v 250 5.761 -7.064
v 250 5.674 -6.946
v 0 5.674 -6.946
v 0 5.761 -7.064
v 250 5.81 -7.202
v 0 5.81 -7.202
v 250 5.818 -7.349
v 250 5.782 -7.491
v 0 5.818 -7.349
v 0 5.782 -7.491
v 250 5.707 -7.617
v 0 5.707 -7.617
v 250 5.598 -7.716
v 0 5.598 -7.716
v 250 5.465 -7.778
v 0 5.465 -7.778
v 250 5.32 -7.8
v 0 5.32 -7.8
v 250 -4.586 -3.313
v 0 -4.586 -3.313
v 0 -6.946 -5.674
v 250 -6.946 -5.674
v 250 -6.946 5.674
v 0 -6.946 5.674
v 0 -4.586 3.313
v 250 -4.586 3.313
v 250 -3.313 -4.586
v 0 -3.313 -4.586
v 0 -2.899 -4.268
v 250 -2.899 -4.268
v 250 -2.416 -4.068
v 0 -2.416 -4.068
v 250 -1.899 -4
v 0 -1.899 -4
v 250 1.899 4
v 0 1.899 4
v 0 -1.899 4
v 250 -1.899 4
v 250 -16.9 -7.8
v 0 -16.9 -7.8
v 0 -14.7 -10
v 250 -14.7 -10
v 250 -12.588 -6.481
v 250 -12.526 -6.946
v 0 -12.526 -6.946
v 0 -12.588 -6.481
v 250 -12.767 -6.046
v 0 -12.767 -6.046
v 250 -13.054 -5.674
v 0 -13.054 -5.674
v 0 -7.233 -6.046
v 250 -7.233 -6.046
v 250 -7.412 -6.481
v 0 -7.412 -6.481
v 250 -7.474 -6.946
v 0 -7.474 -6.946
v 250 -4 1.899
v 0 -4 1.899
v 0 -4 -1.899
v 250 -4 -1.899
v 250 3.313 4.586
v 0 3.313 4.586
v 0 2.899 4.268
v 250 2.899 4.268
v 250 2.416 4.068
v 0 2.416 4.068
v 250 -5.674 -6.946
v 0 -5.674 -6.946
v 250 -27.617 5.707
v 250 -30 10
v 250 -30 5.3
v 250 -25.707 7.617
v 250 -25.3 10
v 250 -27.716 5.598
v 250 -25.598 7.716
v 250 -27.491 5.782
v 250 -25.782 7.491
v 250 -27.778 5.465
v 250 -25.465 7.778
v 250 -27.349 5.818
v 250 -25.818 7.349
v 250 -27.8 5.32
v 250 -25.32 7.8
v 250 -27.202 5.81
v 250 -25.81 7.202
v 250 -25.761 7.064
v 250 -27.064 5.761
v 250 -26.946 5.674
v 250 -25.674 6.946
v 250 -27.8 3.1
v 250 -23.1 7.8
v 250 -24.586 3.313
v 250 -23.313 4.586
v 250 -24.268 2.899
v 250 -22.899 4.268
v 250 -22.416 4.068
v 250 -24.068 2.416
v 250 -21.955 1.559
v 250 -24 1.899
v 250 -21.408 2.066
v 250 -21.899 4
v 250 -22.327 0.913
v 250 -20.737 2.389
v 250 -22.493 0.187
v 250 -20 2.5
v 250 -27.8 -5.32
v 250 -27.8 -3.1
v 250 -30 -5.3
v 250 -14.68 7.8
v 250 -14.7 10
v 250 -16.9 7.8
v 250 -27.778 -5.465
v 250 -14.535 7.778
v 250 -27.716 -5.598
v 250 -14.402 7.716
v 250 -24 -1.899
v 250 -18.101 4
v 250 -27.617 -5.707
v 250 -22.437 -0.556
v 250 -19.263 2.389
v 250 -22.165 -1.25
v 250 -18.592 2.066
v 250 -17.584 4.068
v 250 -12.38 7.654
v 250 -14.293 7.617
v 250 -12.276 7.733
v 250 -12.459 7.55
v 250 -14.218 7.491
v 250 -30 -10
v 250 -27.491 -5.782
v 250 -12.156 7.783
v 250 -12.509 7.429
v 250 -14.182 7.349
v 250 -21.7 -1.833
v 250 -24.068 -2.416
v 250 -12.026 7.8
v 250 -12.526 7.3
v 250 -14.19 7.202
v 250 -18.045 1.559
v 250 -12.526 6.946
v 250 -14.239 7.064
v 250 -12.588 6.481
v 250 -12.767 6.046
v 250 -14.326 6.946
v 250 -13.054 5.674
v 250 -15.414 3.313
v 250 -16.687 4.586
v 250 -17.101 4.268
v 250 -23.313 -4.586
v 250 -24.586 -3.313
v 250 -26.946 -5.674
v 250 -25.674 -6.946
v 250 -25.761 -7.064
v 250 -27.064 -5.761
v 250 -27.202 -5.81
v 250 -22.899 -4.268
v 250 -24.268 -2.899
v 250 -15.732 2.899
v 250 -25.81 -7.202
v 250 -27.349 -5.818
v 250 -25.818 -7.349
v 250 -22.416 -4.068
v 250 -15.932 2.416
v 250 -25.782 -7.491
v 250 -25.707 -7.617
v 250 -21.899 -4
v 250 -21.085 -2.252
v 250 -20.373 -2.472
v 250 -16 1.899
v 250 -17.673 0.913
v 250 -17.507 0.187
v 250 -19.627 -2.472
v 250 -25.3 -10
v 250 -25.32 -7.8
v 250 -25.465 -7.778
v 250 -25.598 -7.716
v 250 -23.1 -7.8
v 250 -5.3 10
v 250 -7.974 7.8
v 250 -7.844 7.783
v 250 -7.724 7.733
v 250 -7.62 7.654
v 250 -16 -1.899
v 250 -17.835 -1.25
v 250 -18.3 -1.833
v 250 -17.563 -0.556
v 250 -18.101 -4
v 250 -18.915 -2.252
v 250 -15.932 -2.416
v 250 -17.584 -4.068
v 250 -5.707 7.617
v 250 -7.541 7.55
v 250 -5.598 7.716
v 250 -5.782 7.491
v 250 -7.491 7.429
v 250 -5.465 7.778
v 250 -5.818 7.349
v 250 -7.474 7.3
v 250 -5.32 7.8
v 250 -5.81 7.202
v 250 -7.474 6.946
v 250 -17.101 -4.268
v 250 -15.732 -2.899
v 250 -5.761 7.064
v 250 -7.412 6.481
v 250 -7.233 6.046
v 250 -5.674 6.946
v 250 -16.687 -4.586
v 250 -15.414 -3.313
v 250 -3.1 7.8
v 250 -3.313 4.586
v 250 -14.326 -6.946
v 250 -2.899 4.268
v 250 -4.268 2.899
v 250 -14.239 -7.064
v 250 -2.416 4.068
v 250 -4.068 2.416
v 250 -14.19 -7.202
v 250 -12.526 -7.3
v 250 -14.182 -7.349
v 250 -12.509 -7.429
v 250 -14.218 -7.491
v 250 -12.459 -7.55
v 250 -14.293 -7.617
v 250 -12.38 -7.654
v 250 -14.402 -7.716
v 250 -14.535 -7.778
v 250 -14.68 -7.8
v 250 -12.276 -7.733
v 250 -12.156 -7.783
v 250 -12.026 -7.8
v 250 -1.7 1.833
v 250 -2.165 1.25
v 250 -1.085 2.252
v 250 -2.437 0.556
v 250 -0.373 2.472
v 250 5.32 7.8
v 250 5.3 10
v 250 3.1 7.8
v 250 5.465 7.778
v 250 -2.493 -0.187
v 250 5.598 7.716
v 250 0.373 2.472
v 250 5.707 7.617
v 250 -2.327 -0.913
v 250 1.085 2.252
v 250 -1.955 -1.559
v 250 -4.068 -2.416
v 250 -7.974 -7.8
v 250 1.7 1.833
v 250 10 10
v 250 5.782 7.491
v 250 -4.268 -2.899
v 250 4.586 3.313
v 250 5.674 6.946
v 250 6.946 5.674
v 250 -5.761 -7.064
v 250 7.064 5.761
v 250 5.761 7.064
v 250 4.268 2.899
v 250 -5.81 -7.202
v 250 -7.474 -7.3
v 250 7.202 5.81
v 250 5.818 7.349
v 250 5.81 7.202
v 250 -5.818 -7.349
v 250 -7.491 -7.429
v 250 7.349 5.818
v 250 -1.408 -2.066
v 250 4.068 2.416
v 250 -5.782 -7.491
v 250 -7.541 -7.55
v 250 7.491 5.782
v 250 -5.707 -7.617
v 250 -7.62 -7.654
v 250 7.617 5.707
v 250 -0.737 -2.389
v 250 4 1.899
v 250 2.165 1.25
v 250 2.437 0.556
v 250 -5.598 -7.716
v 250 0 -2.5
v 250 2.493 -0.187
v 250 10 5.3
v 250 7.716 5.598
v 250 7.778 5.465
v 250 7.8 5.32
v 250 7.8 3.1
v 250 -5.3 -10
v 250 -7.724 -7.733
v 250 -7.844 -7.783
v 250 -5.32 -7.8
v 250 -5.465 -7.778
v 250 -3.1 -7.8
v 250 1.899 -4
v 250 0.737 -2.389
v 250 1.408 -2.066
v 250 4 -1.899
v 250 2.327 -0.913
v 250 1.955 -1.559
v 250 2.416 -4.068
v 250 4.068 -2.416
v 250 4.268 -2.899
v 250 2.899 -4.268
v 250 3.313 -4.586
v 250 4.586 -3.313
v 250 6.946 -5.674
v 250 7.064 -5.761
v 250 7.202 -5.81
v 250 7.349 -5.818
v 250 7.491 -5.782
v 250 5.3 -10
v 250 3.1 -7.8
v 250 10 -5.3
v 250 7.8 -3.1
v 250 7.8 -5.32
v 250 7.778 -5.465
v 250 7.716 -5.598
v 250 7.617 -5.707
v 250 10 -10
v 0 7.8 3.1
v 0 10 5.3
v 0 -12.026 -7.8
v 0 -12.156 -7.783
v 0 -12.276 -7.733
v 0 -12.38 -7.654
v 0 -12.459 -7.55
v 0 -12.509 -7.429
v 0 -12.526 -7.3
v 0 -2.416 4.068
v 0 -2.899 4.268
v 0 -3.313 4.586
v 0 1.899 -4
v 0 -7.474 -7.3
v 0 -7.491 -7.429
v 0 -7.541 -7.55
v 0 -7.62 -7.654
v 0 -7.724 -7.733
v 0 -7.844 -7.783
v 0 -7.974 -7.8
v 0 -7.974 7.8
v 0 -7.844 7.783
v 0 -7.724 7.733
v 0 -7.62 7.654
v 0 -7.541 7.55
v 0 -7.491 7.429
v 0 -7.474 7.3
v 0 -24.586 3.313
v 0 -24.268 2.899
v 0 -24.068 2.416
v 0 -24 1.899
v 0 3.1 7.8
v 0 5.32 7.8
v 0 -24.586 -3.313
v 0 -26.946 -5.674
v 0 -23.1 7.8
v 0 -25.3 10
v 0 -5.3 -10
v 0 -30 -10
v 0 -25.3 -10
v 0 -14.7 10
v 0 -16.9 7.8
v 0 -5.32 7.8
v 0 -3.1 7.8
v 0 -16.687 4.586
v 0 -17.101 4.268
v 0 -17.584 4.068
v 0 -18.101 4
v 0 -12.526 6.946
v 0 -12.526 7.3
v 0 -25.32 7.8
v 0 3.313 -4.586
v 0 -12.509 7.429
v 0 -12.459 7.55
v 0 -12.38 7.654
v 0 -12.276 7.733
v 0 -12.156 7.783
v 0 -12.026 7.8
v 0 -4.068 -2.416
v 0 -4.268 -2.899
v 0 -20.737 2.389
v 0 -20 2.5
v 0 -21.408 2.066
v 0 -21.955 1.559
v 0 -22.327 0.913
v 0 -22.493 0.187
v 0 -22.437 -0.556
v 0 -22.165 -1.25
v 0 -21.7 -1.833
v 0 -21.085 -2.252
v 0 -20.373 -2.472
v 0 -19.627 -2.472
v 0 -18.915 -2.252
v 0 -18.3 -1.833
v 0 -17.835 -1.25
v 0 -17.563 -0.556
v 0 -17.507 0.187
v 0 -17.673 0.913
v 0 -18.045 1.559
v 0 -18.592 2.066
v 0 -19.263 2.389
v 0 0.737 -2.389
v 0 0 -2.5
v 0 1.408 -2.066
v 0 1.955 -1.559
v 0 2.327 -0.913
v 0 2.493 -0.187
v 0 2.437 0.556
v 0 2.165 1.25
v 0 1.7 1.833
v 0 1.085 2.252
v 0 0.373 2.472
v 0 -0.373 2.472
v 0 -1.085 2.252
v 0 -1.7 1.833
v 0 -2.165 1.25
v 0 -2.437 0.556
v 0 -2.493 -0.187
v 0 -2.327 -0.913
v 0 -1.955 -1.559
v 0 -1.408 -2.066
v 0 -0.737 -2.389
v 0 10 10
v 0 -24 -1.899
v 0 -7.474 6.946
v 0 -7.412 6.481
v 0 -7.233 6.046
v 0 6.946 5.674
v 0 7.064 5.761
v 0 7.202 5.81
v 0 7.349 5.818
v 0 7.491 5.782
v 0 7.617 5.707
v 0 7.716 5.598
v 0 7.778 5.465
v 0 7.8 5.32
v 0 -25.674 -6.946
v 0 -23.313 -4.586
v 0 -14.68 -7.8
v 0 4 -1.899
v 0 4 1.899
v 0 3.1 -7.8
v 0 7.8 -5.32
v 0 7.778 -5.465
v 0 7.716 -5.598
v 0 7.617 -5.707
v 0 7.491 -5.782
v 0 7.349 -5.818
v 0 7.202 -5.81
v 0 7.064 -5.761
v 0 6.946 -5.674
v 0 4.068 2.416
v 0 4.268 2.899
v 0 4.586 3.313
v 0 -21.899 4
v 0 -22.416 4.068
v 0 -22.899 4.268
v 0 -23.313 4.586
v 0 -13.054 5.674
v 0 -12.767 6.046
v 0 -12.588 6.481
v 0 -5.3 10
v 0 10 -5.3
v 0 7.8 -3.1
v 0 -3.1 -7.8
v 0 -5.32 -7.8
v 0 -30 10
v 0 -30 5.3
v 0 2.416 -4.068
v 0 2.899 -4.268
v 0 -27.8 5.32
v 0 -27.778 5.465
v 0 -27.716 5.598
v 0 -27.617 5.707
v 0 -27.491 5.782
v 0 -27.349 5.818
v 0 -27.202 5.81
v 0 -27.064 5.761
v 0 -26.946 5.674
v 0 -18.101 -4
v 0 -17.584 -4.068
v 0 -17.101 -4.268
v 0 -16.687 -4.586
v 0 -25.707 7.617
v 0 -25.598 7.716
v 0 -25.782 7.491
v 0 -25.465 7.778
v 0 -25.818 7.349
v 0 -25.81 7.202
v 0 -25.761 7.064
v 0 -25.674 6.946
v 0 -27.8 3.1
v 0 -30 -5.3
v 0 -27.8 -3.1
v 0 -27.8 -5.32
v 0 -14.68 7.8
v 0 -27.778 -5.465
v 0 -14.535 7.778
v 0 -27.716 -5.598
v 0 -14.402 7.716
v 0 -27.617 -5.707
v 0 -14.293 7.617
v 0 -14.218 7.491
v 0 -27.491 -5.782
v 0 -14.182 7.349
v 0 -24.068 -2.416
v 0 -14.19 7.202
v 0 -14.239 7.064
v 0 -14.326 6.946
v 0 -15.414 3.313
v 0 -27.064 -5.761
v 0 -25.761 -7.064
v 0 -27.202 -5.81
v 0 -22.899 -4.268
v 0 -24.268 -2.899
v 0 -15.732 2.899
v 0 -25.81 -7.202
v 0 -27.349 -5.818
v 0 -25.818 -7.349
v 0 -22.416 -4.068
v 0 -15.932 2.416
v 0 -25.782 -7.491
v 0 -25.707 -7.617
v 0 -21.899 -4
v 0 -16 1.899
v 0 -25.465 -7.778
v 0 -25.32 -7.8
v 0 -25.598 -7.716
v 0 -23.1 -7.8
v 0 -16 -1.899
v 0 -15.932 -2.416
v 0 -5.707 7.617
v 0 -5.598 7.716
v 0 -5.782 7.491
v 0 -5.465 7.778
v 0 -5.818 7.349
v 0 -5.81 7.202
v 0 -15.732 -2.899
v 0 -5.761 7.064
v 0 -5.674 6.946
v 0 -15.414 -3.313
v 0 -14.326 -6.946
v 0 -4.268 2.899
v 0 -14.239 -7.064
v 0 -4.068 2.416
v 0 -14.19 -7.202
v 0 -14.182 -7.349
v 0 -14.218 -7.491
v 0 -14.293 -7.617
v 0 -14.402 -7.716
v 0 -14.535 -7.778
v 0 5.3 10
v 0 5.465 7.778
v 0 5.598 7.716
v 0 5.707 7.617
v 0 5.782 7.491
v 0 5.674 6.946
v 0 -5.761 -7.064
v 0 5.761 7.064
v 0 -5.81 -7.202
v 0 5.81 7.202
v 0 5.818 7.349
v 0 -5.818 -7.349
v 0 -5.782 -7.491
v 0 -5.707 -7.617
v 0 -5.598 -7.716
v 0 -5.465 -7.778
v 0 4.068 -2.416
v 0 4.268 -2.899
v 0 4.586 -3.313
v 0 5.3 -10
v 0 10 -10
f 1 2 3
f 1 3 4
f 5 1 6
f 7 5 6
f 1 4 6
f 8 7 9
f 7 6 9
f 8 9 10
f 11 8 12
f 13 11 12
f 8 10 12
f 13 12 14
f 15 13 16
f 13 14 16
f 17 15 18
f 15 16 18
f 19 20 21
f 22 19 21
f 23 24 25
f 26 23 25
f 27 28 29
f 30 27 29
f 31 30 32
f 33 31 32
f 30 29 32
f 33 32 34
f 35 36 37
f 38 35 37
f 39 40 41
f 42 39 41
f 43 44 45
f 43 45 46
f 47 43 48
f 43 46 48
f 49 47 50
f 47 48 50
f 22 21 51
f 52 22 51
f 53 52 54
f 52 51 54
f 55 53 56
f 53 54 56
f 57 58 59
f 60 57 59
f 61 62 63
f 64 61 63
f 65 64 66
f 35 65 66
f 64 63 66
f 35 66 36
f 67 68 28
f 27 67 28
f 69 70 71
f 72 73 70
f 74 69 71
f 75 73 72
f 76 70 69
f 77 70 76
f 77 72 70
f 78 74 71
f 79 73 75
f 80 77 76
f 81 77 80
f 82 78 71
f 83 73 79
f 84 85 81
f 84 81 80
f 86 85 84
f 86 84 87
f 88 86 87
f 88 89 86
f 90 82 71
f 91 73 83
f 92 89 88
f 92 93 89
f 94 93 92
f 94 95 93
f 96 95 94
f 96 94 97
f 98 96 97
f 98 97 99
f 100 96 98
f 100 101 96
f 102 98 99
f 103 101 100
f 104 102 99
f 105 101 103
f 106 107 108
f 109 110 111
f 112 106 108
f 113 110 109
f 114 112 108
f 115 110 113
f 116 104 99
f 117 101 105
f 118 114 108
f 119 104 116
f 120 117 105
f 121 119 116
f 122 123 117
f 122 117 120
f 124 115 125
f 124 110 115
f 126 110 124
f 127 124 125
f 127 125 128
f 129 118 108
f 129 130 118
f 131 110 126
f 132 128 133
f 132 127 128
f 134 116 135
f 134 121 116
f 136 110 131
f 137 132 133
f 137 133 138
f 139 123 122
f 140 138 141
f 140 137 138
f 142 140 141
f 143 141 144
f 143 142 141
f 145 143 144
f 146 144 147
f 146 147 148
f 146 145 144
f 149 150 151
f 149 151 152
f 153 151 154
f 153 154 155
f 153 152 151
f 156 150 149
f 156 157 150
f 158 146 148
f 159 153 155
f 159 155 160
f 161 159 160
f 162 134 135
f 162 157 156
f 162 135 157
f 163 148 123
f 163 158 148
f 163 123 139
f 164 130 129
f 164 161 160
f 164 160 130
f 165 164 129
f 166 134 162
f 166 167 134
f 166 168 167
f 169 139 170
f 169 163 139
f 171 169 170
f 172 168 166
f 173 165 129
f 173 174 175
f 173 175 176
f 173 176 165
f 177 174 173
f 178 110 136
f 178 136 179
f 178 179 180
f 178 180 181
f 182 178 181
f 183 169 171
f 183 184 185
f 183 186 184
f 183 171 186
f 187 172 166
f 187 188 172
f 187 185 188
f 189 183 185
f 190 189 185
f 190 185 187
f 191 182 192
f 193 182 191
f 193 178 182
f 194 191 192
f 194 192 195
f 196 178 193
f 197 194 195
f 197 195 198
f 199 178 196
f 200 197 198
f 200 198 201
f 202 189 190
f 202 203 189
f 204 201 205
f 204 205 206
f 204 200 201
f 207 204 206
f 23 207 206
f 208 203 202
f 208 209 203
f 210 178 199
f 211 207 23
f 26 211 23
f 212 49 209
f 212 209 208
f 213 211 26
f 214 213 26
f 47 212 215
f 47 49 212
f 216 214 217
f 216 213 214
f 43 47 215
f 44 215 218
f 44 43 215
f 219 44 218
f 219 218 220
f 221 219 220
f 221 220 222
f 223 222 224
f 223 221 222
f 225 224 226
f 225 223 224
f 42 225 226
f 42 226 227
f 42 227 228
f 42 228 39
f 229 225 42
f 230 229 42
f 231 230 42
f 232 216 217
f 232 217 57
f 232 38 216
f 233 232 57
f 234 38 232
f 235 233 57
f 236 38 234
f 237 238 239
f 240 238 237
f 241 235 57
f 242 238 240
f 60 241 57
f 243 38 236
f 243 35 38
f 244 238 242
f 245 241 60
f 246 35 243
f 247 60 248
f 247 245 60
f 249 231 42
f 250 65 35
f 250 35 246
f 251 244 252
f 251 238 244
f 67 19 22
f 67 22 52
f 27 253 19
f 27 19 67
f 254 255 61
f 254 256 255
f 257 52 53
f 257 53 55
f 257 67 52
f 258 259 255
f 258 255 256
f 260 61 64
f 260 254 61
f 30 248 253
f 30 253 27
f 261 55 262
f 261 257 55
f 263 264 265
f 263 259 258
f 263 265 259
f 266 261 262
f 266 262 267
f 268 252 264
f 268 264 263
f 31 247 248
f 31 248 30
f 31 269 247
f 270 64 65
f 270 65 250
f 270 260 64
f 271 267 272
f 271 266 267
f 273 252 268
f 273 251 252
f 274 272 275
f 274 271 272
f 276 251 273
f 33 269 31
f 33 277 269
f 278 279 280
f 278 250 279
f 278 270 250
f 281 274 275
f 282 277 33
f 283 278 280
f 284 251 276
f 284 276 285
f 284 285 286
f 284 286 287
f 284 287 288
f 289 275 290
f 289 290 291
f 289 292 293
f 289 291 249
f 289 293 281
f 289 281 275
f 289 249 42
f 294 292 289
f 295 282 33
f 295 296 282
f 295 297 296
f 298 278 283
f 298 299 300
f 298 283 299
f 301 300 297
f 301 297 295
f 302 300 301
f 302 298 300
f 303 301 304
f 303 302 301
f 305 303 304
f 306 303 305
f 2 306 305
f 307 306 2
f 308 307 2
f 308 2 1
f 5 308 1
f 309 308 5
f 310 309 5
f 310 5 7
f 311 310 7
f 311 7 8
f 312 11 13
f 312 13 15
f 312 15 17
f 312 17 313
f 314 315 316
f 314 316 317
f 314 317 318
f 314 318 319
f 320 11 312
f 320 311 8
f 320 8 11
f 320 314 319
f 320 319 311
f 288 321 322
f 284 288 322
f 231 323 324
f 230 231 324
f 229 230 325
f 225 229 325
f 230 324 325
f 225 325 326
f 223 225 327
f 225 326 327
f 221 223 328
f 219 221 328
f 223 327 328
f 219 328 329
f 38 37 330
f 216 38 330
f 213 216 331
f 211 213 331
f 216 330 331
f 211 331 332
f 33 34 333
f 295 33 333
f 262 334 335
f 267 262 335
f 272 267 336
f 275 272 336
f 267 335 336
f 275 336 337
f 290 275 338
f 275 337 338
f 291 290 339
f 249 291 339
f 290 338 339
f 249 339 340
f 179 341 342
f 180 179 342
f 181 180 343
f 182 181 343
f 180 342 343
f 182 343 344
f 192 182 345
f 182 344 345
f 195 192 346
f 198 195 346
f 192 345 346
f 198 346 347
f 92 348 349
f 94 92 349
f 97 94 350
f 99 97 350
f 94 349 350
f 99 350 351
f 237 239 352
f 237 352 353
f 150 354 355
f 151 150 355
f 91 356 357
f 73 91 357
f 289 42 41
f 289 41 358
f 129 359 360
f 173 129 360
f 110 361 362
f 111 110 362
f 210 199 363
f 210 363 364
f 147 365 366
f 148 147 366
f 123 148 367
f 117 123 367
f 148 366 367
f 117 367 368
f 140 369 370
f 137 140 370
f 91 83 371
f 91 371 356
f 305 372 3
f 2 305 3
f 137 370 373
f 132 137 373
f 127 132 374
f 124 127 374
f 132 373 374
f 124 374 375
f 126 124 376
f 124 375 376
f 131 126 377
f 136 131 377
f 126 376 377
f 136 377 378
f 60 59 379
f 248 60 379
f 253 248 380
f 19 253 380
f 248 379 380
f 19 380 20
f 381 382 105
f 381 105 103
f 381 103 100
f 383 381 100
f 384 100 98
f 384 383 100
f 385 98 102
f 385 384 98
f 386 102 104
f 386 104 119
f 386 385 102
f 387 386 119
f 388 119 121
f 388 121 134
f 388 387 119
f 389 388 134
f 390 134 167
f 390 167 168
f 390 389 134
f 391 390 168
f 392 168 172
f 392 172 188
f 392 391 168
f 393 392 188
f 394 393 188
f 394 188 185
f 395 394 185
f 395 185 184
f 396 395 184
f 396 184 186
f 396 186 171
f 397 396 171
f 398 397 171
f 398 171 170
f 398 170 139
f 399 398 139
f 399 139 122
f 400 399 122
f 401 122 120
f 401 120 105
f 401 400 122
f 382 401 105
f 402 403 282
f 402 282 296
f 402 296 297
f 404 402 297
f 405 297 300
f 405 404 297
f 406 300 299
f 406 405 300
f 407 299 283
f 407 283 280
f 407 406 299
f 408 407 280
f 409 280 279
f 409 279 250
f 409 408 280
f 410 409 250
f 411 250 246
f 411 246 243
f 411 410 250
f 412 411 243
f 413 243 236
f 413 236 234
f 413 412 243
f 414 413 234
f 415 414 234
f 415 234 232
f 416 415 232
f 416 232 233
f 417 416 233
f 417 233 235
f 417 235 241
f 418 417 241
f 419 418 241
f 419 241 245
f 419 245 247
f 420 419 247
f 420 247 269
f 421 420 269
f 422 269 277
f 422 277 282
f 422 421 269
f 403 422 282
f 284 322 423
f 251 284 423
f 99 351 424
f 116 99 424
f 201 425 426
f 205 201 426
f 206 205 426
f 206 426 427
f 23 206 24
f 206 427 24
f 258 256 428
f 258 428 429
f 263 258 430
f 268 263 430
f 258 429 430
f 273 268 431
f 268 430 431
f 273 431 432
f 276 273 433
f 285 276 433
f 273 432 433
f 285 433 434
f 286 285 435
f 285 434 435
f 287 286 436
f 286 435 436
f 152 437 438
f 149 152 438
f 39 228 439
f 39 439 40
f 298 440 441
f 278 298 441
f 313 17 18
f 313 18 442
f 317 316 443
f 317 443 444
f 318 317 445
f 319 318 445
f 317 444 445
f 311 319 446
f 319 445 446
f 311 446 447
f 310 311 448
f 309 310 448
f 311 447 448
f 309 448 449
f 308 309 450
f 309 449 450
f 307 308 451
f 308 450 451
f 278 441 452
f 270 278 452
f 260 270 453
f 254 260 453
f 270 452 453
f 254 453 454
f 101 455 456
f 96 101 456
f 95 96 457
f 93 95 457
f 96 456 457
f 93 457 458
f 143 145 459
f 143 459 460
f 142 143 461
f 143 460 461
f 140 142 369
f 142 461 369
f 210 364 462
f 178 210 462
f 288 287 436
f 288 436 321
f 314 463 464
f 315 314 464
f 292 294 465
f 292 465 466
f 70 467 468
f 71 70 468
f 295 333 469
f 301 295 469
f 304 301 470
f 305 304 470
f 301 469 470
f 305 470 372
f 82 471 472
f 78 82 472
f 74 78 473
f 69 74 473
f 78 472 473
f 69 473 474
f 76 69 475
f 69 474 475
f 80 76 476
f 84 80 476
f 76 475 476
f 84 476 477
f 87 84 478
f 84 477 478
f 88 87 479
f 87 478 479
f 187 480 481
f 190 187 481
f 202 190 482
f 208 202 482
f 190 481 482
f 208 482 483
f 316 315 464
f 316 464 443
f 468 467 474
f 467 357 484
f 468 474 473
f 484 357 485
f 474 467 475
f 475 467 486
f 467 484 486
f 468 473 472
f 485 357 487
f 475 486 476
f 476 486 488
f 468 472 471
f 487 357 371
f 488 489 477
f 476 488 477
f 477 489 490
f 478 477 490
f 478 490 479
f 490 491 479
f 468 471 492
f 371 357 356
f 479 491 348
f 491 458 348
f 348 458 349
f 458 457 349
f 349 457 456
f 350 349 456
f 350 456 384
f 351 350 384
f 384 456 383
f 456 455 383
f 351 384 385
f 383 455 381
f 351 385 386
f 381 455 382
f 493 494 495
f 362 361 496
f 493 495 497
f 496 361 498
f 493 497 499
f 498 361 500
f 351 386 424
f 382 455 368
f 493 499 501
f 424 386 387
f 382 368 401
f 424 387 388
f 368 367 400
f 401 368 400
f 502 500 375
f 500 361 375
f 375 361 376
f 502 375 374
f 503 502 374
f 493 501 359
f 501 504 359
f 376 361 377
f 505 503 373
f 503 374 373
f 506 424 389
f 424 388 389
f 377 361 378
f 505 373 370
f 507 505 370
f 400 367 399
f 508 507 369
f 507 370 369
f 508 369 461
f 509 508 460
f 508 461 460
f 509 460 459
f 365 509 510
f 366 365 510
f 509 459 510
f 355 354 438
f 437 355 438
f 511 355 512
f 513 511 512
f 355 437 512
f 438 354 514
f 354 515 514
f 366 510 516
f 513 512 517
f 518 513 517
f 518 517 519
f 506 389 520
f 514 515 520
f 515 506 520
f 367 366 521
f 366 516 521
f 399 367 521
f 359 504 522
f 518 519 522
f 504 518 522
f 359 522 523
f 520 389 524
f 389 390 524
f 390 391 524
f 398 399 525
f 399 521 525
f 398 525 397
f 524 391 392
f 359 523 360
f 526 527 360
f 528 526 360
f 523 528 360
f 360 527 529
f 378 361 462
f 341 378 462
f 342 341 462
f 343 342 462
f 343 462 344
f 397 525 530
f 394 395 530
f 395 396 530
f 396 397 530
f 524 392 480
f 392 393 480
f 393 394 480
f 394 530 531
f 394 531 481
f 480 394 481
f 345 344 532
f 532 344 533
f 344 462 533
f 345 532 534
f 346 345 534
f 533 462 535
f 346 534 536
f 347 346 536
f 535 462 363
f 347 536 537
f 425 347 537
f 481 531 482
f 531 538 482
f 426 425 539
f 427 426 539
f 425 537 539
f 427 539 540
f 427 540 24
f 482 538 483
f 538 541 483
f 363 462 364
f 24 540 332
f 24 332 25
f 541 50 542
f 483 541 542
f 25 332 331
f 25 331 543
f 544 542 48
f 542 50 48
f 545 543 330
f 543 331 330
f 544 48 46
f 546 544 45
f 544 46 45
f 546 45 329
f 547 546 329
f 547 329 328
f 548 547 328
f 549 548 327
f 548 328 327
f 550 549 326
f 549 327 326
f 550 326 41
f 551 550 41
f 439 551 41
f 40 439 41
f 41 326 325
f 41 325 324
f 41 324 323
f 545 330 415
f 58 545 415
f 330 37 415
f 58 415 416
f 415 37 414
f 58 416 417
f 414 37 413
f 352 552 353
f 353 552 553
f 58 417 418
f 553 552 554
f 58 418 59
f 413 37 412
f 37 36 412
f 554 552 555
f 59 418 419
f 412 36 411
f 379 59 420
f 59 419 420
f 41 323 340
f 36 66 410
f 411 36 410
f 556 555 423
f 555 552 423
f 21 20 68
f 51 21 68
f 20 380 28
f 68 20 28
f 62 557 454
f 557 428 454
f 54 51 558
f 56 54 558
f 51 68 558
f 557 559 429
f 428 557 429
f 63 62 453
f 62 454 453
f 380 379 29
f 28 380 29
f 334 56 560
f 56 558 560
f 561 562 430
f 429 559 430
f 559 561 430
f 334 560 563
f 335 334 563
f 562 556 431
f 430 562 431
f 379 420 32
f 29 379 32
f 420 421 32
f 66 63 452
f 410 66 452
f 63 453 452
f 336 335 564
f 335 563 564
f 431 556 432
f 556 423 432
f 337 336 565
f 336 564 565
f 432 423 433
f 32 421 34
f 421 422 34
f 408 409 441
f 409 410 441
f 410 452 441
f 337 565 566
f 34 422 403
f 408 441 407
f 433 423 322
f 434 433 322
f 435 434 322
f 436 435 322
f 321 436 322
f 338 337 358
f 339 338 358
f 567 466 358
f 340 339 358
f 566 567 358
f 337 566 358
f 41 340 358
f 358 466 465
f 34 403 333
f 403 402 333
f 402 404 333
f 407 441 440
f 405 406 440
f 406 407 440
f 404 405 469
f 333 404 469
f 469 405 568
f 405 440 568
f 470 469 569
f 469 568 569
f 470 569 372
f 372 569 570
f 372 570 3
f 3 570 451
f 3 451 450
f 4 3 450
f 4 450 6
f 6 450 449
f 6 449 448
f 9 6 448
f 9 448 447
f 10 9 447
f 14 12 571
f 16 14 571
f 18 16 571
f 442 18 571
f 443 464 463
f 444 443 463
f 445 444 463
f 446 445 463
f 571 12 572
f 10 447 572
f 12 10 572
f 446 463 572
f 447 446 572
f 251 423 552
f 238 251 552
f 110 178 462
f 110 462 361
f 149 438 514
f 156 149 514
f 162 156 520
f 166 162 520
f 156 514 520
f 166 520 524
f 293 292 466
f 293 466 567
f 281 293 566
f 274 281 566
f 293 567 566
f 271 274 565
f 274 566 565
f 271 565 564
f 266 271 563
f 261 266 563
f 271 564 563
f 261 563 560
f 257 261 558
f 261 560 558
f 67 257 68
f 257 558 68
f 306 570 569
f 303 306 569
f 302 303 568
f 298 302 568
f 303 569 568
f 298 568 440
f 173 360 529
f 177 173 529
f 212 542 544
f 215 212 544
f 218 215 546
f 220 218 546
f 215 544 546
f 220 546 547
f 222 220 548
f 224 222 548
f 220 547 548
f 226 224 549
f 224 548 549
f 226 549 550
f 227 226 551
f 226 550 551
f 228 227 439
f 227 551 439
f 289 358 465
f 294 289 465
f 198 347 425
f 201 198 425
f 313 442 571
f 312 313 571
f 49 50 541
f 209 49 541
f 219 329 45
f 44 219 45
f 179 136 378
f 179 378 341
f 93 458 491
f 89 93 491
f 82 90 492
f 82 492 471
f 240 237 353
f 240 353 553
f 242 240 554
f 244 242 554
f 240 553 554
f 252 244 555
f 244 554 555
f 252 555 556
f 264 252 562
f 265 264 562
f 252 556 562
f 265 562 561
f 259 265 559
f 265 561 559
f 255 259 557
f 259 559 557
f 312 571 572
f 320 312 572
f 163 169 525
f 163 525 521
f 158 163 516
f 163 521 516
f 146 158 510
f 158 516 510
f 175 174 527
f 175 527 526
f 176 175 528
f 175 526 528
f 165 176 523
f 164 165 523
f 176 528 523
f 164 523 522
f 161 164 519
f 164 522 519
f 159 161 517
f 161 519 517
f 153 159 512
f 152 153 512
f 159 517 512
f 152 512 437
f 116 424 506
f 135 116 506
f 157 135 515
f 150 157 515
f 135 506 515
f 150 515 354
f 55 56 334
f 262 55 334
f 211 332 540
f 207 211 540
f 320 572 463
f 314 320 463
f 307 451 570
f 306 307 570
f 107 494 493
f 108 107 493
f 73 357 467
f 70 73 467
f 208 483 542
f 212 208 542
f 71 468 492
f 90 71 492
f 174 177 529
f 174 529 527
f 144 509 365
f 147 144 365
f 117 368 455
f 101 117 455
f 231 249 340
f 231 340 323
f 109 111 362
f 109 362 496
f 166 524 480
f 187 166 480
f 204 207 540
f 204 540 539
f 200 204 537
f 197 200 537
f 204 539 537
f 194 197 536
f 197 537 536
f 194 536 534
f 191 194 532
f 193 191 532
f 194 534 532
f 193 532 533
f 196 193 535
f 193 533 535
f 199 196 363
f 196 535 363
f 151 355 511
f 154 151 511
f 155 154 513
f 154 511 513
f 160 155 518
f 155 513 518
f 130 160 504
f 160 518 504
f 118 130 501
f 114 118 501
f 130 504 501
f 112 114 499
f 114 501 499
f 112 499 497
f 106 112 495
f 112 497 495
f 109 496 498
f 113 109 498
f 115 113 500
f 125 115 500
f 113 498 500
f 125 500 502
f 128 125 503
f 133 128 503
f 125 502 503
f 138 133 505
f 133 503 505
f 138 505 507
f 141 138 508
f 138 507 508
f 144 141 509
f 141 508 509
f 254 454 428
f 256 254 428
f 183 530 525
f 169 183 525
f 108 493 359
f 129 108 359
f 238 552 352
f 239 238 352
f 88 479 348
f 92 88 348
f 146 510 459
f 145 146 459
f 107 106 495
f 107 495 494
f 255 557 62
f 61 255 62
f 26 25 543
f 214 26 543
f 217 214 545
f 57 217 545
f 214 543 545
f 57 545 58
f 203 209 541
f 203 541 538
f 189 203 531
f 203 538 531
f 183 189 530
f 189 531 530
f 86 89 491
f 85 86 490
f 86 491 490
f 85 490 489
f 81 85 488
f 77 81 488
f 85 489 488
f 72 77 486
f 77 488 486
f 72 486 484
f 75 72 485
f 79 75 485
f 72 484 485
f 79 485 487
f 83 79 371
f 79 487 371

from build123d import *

# Parameters (mm, degrees)
SKETCH1_R           = 2.5
BOSS_EXTRUDE1_DEPTH = 250


with BuildPart() as part:
    # Sketch1 → Boss-Extrude1 (new body)
    with BuildSketch(Plane(origin=(0, 0, 0), x_dir=(0, 0, -1), z_dir=(1, 0, 0))):
        with BuildLine():
            Line((-10, 10), (-10, 5.3))
            Line((-10, 5.3), (-7.8, 3.1))
            Line((-7.8, 3.1), (-7.8, 5.320101013))
            ThreePointArc((-7.8, 5.320101013), (-7.491341716, 5.782040779), (-6.946446609, 5.673654403))
            Line((-6.946446609, 5.673654403), (-4.585786438, 3.312994231))
            ThreePointArc((-4.585786438, 3.312994231), (-4.152240935, 2.664147534), (-4, 1.898780669))
            Line((-4, 1.898780669), (-4, 0))
            Line((-4, 0), (-4, -1.898780669))
            ThreePointArc((-4, -1.898780669), (-4.152240935, -2.664147534), (-4.585786438, -3.312994231))
            Line((-4.585786438, -3.312994231), (-6.946446609, -5.673654403))
            ThreePointArc((-6.946446609, -5.673654403), (-7.491341716, -5.782040779), (-7.8, -5.320101013))
            Line((-7.8, -5.320101013), (-7.8, -3.1))
            Line((-7.8, -3.1), (-10, -5.3))
            Line((-10, -5.3), (-10, -14.7))
            Line((-10, -14.7), (-7.8, -16.9))
            Line((-7.8, -16.9), (-7.8, -14.679898987))
            ThreePointArc((-7.8, -14.679898987), (-7.491341716, -14.217959221), (-6.946446609, -14.326345597))
            Line((-6.946446609, -14.326345597), (-4.585786438, -16.687005769))
            ThreePointArc((-4.585786438, -16.687005769), (-4.152240935, -17.335852466), (-4, -18.101219331))
            Line((-4, -18.101219331), (-4, -20))
            Line((-4, -20), (-4, -21.898780669))
            ThreePointArc((-4, -21.898780669), (-4.152240935, -22.664147534), (-4.585786438, -23.312994231))
            Line((-4.585786438, -23.312994231), (-6.946446609, -25.673654403))
            ThreePointArc((-6.946446609, -25.673654403), (-7.491341716, -25.782040779), (-7.8, -25.320101013))
            Line((-7.8, -25.320101013), (-7.8, -23.1))
            Line((-7.8, -23.1), (-10, -25.3))
            Line((-10, -25.3), (-10, -30))
            Line((-10, -30), (-5.3, -30))
            Line((-5.3, -30), (-3.1, -27.8))
            Line((-3.1, -27.8), (-5.320101013, -27.8))
            ThreePointArc((-5.320101013, -27.8), (-5.782040779, -27.491341716), (-5.673654403, -26.946446609))
            Line((-5.673654403, -26.946446609), (-3.312994231, -24.585786438))
            ThreePointArc((-3.312994231, -24.585786438), (-2.664147534, -24.152240935), (-1.898780669, -24))
            Line((-1.898780669, -24), (1.898780669, -24))
            ThreePointArc((1.898780669, -24), (2.664147534, -24.152240935), (3.312994231, -24.585786438))
            Line((3.312994231, -24.585786438), (5.673654403, -26.946446609))
            ThreePointArc((5.673654403, -26.946446609), (5.782040779, -27.491341716), (5.320101013, -27.8))
            Line((5.320101013, -27.8), (3.1, -27.8))
            Line((3.1, -27.8), (5.3, -30))
            Line((5.3, -30), (10, -30))
            Line((10, -30), (10, -25.3))
            Line((10, -25.3), (7.8, -23.1))
            Line((7.8, -23.1), (7.8, -25.320101013))
            ThreePointArc((7.8, -25.320101013), (7.491341716, -25.782040779), (6.946446609, -25.673654403))
            Line((6.946446609, -25.673654403), (4.585786438, -23.312994231))
            ThreePointArc((4.585786438, -23.312994231), (4.152240935, -22.664147534), (4, -21.898780669))
            Line((4, -21.898780669), (4, -20))
            Line((4, -20), (4, -18.101219331))
            ThreePointArc((4, -18.101219331), (4.152240935, -17.335852466), (4.585786438, -16.687005769))
            Line((4.585786438, -16.687005769), (6.946446609, -14.326345597))
            ThreePointArc((6.946446609, -14.326345597), (7.491341716, -14.217959221), (7.8, -14.679898987))
            Line((7.8, -14.679898987), (7.8, -16.9))
            Line((7.8, -16.9), (10, -14.7))
            Line((10, -14.7), (10, -5.3))
            Line((10, -5.3), (7.8, -3.1))
            Line((7.8, -3.1), (7.8, -5.320101013))
            ThreePointArc((7.8, -5.320101013), (7.491341716, -5.782040779), (6.946446609, -5.673654403))
            Line((6.946446609, -5.673654403), (4.585786438, -3.312994231))
            ThreePointArc((4.585786438, -3.312994231), (4.152240935, -2.664147534), (4, -1.898780669))
            Line((4, -1.898780669), (4, 0))
            Line((4, 0), (4, 1.898780669))
            ThreePointArc((4, 1.898780669), (4.152240935, 2.664147534), (4.585786438, 3.312994231))
            Line((4.585786438, 3.312994231), (6.946446609, 5.673654403))
            ThreePointArc((6.946446609, 5.673654403), (7.491341716, 5.782040779), (7.8, 5.320101013))
            Line((7.8, 5.320101013), (7.8, 3.1))
            Line((7.8, 3.1), (10, 5.3))
            Line((10, 5.3), (10, 10))
            Line((10, 10), (5.3, 10))
            Line((5.3, 10), (3.1, 7.8))
            Line((3.1, 7.8), (5.320101013, 7.8))
            ThreePointArc((5.320101013, 7.8), (5.782040779, 7.491341716), (5.673654403, 6.946446609))
            Line((5.673654403, 6.946446609), (3.312994231, 4.585786438))
            ThreePointArc((3.312994231, 4.585786438), (2.664147534, 4.152240935), (1.898780669, 4))
            Line((1.898780669, 4), (-1.898780669, 4))
            ThreePointArc((-1.898780669, 4), (-2.664147534, 4.152240935), (-3.312994231, 4.585786438))
            Line((-3.312994231, 4.585786438), (-5.673654403, 6.946446609))
            ThreePointArc((-5.673654403, 6.946446609), (-5.782040779, 7.491341716), (-5.320101013, 7.8))
            Line((-5.320101013, 7.8), (-3.1, 7.8))
            Line((-3.1, 7.8), (-5.3, 10))
            Line((-5.3, 10), (-10, 10))
        make_face()
        Circle(SKETCH1_R, mode=Mode.SUBTRACT)
        with Locations(Location((0, -20, 0), (0, 0, 180))):
            Circle(SKETCH1_R, mode=Mode.SUBTRACT)
        with BuildLine():
            Line((-5.673654403, -6.946446609), (-3.312994231, -4.585786438))
            ThreePointArc((-3.312994231, -4.585786438), (-2.664147534, -4.152240935), (-1.898780669, -4))
            Line((-1.898780669, -4), (1.898780669, -4))
            ThreePointArc((1.898780669, -4), (2.664147534, -4.152240935), (3.312994231, -4.585786438))
            Line((3.312994231, -4.585786438), (5.673654403, -6.946446609))
            ThreePointArc((5.673654403, -6.946446609), (6.257616431, -7.336637562), (6.946446609, -7.473654403))
            Line((6.946446609, -7.473654403), (7.3, -7.473654403))
            ThreePointArc((7.3, -7.473654403), (7.653553391, -7.620101013), (7.8, -7.973654403))
            Line((7.8, -7.973654403), (7.8, -12.026345597))
            ThreePointArc((7.8, -12.026345597), (7.653553391, -12.379898987), (7.3, -12.526345597))
            Line((7.3, -12.526345597), (6.946446609, -12.526345597))
            ThreePointArc((6.946446609, -12.526345597), (6.257616431, -12.663362438), (5.673654403, -13.053553391))
            Line((5.673654403, -13.053553391), (3.312994231, -15.414213562))
            ThreePointArc((3.312994231, -15.414213562), (2.664147534, -15.847759065), (1.898780669, -16))
            Line((1.898780669, -16), (-1.898780669, -16))
            ThreePointArc((-1.898780669, -16), (-2.664147534, -15.847759065), (-3.312994231, -15.414213562))
            Line((-3.312994231, -15.414213562), (-5.673654403, -13.053553391))
            ThreePointArc((-5.673654403, -13.053553391), (-6.257616431, -12.663362438), (-6.946446609, -12.526345597))
            Line((-6.946446609, -12.526345597), (-7.3, -12.526345597))
            ThreePointArc((-7.3, -12.526345597), (-7.653553391, -12.379898987), (-7.8, -12.026345597))
            Line((-7.8, -12.026345597), (-7.8, -7.973654403))
            ThreePointArc((-7.8, -7.973654403), (-7.653553391, -7.620101013), (-7.3, -7.473654403))
            Line((-7.3, -7.473654403), (-6.946446609, -7.473654403))
            ThreePointArc((-6.946446609, -7.473654403), (-6.257616431, -7.336637562), (-5.673654403, -6.946446609))
        make_face(mode=Mode.SUBTRACT)
    extrude(amount=BOSS_EXTRUDE1_DEPTH)


solid = part.part
